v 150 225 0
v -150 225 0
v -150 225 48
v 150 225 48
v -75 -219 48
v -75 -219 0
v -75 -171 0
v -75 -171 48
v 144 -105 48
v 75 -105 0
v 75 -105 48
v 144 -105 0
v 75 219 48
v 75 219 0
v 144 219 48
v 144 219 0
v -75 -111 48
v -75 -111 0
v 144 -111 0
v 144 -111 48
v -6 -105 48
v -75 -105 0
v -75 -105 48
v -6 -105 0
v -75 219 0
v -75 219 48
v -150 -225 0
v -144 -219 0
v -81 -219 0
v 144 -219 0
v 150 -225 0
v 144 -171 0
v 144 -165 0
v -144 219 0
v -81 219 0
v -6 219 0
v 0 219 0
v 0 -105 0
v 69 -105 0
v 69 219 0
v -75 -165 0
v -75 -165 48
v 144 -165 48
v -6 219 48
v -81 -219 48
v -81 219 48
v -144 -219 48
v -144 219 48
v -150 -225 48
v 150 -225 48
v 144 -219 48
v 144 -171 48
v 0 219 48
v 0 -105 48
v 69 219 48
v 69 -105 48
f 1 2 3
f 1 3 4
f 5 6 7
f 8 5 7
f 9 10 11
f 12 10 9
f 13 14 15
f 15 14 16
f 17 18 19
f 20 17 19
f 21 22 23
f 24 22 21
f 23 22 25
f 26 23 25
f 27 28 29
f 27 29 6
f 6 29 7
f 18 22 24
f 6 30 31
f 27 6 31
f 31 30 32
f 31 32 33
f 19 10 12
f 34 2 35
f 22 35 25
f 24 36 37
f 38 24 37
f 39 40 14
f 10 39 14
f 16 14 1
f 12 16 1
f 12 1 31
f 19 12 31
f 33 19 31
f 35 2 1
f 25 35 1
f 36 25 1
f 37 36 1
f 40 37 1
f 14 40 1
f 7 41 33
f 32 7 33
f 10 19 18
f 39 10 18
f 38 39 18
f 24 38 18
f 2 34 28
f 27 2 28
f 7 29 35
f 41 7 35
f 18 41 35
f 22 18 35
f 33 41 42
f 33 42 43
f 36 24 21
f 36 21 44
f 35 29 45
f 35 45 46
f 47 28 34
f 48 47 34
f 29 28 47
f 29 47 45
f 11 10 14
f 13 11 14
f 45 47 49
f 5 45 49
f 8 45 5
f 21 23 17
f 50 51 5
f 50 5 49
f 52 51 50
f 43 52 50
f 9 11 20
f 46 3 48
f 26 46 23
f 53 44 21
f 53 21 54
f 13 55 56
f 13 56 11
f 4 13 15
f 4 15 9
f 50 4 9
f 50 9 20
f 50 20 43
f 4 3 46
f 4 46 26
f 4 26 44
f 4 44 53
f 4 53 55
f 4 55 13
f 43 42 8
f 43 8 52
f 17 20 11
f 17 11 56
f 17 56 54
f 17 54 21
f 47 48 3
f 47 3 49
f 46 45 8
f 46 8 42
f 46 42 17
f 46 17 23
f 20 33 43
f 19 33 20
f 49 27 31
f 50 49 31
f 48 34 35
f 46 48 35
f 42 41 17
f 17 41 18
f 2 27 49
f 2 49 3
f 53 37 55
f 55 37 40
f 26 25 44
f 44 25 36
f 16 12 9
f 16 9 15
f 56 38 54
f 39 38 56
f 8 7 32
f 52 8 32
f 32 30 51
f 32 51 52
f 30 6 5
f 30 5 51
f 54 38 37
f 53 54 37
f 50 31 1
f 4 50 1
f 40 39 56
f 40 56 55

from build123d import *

# Parameters (mm, degrees)
F0_W     = 300
F0_H     = 450
F0_W_2   = 219
F0_H_2   = 48
F0_H_3   = 54
F0_W_3   = 63
F0_H_4   = 438
F0_W_4   = 69
F0_H_5   = 324
F1_DEPTH = 48


with BuildPart() as f1:
    # F0 (on Top) → F1 (new body)
    with BuildSketch(Plane.XY):
        Rectangle(F0_W, F0_H)
        with Locations((34.5, -195)):
            Rectangle(F0_W_2, F0_H_2, mode=Mode.SUBTRACT)
        with Locations((34.5, -138)):
            Rectangle(F0_W_2, F0_H_3, mode=Mode.SUBTRACT)
        with Locations((-112.5, 0)):
            Rectangle(F0_W_3, F0_H_4, mode=Mode.SUBTRACT)
        with Locations((-40.5, 57)):
            Rectangle(F0_W_4, F0_H_5, mode=Mode.SUBTRACT)
        with Locations((34.5, 57)):
            Rectangle(F0_W_4, F0_H_5, mode=Mode.SUBTRACT)
        with Locations((109.5, 57)):
            Rectangle(F0_W_4, F0_H_5, mode=Mode.SUBTRACT)
    extrude(amount=F1_DEPTH)


solid = f1.part
